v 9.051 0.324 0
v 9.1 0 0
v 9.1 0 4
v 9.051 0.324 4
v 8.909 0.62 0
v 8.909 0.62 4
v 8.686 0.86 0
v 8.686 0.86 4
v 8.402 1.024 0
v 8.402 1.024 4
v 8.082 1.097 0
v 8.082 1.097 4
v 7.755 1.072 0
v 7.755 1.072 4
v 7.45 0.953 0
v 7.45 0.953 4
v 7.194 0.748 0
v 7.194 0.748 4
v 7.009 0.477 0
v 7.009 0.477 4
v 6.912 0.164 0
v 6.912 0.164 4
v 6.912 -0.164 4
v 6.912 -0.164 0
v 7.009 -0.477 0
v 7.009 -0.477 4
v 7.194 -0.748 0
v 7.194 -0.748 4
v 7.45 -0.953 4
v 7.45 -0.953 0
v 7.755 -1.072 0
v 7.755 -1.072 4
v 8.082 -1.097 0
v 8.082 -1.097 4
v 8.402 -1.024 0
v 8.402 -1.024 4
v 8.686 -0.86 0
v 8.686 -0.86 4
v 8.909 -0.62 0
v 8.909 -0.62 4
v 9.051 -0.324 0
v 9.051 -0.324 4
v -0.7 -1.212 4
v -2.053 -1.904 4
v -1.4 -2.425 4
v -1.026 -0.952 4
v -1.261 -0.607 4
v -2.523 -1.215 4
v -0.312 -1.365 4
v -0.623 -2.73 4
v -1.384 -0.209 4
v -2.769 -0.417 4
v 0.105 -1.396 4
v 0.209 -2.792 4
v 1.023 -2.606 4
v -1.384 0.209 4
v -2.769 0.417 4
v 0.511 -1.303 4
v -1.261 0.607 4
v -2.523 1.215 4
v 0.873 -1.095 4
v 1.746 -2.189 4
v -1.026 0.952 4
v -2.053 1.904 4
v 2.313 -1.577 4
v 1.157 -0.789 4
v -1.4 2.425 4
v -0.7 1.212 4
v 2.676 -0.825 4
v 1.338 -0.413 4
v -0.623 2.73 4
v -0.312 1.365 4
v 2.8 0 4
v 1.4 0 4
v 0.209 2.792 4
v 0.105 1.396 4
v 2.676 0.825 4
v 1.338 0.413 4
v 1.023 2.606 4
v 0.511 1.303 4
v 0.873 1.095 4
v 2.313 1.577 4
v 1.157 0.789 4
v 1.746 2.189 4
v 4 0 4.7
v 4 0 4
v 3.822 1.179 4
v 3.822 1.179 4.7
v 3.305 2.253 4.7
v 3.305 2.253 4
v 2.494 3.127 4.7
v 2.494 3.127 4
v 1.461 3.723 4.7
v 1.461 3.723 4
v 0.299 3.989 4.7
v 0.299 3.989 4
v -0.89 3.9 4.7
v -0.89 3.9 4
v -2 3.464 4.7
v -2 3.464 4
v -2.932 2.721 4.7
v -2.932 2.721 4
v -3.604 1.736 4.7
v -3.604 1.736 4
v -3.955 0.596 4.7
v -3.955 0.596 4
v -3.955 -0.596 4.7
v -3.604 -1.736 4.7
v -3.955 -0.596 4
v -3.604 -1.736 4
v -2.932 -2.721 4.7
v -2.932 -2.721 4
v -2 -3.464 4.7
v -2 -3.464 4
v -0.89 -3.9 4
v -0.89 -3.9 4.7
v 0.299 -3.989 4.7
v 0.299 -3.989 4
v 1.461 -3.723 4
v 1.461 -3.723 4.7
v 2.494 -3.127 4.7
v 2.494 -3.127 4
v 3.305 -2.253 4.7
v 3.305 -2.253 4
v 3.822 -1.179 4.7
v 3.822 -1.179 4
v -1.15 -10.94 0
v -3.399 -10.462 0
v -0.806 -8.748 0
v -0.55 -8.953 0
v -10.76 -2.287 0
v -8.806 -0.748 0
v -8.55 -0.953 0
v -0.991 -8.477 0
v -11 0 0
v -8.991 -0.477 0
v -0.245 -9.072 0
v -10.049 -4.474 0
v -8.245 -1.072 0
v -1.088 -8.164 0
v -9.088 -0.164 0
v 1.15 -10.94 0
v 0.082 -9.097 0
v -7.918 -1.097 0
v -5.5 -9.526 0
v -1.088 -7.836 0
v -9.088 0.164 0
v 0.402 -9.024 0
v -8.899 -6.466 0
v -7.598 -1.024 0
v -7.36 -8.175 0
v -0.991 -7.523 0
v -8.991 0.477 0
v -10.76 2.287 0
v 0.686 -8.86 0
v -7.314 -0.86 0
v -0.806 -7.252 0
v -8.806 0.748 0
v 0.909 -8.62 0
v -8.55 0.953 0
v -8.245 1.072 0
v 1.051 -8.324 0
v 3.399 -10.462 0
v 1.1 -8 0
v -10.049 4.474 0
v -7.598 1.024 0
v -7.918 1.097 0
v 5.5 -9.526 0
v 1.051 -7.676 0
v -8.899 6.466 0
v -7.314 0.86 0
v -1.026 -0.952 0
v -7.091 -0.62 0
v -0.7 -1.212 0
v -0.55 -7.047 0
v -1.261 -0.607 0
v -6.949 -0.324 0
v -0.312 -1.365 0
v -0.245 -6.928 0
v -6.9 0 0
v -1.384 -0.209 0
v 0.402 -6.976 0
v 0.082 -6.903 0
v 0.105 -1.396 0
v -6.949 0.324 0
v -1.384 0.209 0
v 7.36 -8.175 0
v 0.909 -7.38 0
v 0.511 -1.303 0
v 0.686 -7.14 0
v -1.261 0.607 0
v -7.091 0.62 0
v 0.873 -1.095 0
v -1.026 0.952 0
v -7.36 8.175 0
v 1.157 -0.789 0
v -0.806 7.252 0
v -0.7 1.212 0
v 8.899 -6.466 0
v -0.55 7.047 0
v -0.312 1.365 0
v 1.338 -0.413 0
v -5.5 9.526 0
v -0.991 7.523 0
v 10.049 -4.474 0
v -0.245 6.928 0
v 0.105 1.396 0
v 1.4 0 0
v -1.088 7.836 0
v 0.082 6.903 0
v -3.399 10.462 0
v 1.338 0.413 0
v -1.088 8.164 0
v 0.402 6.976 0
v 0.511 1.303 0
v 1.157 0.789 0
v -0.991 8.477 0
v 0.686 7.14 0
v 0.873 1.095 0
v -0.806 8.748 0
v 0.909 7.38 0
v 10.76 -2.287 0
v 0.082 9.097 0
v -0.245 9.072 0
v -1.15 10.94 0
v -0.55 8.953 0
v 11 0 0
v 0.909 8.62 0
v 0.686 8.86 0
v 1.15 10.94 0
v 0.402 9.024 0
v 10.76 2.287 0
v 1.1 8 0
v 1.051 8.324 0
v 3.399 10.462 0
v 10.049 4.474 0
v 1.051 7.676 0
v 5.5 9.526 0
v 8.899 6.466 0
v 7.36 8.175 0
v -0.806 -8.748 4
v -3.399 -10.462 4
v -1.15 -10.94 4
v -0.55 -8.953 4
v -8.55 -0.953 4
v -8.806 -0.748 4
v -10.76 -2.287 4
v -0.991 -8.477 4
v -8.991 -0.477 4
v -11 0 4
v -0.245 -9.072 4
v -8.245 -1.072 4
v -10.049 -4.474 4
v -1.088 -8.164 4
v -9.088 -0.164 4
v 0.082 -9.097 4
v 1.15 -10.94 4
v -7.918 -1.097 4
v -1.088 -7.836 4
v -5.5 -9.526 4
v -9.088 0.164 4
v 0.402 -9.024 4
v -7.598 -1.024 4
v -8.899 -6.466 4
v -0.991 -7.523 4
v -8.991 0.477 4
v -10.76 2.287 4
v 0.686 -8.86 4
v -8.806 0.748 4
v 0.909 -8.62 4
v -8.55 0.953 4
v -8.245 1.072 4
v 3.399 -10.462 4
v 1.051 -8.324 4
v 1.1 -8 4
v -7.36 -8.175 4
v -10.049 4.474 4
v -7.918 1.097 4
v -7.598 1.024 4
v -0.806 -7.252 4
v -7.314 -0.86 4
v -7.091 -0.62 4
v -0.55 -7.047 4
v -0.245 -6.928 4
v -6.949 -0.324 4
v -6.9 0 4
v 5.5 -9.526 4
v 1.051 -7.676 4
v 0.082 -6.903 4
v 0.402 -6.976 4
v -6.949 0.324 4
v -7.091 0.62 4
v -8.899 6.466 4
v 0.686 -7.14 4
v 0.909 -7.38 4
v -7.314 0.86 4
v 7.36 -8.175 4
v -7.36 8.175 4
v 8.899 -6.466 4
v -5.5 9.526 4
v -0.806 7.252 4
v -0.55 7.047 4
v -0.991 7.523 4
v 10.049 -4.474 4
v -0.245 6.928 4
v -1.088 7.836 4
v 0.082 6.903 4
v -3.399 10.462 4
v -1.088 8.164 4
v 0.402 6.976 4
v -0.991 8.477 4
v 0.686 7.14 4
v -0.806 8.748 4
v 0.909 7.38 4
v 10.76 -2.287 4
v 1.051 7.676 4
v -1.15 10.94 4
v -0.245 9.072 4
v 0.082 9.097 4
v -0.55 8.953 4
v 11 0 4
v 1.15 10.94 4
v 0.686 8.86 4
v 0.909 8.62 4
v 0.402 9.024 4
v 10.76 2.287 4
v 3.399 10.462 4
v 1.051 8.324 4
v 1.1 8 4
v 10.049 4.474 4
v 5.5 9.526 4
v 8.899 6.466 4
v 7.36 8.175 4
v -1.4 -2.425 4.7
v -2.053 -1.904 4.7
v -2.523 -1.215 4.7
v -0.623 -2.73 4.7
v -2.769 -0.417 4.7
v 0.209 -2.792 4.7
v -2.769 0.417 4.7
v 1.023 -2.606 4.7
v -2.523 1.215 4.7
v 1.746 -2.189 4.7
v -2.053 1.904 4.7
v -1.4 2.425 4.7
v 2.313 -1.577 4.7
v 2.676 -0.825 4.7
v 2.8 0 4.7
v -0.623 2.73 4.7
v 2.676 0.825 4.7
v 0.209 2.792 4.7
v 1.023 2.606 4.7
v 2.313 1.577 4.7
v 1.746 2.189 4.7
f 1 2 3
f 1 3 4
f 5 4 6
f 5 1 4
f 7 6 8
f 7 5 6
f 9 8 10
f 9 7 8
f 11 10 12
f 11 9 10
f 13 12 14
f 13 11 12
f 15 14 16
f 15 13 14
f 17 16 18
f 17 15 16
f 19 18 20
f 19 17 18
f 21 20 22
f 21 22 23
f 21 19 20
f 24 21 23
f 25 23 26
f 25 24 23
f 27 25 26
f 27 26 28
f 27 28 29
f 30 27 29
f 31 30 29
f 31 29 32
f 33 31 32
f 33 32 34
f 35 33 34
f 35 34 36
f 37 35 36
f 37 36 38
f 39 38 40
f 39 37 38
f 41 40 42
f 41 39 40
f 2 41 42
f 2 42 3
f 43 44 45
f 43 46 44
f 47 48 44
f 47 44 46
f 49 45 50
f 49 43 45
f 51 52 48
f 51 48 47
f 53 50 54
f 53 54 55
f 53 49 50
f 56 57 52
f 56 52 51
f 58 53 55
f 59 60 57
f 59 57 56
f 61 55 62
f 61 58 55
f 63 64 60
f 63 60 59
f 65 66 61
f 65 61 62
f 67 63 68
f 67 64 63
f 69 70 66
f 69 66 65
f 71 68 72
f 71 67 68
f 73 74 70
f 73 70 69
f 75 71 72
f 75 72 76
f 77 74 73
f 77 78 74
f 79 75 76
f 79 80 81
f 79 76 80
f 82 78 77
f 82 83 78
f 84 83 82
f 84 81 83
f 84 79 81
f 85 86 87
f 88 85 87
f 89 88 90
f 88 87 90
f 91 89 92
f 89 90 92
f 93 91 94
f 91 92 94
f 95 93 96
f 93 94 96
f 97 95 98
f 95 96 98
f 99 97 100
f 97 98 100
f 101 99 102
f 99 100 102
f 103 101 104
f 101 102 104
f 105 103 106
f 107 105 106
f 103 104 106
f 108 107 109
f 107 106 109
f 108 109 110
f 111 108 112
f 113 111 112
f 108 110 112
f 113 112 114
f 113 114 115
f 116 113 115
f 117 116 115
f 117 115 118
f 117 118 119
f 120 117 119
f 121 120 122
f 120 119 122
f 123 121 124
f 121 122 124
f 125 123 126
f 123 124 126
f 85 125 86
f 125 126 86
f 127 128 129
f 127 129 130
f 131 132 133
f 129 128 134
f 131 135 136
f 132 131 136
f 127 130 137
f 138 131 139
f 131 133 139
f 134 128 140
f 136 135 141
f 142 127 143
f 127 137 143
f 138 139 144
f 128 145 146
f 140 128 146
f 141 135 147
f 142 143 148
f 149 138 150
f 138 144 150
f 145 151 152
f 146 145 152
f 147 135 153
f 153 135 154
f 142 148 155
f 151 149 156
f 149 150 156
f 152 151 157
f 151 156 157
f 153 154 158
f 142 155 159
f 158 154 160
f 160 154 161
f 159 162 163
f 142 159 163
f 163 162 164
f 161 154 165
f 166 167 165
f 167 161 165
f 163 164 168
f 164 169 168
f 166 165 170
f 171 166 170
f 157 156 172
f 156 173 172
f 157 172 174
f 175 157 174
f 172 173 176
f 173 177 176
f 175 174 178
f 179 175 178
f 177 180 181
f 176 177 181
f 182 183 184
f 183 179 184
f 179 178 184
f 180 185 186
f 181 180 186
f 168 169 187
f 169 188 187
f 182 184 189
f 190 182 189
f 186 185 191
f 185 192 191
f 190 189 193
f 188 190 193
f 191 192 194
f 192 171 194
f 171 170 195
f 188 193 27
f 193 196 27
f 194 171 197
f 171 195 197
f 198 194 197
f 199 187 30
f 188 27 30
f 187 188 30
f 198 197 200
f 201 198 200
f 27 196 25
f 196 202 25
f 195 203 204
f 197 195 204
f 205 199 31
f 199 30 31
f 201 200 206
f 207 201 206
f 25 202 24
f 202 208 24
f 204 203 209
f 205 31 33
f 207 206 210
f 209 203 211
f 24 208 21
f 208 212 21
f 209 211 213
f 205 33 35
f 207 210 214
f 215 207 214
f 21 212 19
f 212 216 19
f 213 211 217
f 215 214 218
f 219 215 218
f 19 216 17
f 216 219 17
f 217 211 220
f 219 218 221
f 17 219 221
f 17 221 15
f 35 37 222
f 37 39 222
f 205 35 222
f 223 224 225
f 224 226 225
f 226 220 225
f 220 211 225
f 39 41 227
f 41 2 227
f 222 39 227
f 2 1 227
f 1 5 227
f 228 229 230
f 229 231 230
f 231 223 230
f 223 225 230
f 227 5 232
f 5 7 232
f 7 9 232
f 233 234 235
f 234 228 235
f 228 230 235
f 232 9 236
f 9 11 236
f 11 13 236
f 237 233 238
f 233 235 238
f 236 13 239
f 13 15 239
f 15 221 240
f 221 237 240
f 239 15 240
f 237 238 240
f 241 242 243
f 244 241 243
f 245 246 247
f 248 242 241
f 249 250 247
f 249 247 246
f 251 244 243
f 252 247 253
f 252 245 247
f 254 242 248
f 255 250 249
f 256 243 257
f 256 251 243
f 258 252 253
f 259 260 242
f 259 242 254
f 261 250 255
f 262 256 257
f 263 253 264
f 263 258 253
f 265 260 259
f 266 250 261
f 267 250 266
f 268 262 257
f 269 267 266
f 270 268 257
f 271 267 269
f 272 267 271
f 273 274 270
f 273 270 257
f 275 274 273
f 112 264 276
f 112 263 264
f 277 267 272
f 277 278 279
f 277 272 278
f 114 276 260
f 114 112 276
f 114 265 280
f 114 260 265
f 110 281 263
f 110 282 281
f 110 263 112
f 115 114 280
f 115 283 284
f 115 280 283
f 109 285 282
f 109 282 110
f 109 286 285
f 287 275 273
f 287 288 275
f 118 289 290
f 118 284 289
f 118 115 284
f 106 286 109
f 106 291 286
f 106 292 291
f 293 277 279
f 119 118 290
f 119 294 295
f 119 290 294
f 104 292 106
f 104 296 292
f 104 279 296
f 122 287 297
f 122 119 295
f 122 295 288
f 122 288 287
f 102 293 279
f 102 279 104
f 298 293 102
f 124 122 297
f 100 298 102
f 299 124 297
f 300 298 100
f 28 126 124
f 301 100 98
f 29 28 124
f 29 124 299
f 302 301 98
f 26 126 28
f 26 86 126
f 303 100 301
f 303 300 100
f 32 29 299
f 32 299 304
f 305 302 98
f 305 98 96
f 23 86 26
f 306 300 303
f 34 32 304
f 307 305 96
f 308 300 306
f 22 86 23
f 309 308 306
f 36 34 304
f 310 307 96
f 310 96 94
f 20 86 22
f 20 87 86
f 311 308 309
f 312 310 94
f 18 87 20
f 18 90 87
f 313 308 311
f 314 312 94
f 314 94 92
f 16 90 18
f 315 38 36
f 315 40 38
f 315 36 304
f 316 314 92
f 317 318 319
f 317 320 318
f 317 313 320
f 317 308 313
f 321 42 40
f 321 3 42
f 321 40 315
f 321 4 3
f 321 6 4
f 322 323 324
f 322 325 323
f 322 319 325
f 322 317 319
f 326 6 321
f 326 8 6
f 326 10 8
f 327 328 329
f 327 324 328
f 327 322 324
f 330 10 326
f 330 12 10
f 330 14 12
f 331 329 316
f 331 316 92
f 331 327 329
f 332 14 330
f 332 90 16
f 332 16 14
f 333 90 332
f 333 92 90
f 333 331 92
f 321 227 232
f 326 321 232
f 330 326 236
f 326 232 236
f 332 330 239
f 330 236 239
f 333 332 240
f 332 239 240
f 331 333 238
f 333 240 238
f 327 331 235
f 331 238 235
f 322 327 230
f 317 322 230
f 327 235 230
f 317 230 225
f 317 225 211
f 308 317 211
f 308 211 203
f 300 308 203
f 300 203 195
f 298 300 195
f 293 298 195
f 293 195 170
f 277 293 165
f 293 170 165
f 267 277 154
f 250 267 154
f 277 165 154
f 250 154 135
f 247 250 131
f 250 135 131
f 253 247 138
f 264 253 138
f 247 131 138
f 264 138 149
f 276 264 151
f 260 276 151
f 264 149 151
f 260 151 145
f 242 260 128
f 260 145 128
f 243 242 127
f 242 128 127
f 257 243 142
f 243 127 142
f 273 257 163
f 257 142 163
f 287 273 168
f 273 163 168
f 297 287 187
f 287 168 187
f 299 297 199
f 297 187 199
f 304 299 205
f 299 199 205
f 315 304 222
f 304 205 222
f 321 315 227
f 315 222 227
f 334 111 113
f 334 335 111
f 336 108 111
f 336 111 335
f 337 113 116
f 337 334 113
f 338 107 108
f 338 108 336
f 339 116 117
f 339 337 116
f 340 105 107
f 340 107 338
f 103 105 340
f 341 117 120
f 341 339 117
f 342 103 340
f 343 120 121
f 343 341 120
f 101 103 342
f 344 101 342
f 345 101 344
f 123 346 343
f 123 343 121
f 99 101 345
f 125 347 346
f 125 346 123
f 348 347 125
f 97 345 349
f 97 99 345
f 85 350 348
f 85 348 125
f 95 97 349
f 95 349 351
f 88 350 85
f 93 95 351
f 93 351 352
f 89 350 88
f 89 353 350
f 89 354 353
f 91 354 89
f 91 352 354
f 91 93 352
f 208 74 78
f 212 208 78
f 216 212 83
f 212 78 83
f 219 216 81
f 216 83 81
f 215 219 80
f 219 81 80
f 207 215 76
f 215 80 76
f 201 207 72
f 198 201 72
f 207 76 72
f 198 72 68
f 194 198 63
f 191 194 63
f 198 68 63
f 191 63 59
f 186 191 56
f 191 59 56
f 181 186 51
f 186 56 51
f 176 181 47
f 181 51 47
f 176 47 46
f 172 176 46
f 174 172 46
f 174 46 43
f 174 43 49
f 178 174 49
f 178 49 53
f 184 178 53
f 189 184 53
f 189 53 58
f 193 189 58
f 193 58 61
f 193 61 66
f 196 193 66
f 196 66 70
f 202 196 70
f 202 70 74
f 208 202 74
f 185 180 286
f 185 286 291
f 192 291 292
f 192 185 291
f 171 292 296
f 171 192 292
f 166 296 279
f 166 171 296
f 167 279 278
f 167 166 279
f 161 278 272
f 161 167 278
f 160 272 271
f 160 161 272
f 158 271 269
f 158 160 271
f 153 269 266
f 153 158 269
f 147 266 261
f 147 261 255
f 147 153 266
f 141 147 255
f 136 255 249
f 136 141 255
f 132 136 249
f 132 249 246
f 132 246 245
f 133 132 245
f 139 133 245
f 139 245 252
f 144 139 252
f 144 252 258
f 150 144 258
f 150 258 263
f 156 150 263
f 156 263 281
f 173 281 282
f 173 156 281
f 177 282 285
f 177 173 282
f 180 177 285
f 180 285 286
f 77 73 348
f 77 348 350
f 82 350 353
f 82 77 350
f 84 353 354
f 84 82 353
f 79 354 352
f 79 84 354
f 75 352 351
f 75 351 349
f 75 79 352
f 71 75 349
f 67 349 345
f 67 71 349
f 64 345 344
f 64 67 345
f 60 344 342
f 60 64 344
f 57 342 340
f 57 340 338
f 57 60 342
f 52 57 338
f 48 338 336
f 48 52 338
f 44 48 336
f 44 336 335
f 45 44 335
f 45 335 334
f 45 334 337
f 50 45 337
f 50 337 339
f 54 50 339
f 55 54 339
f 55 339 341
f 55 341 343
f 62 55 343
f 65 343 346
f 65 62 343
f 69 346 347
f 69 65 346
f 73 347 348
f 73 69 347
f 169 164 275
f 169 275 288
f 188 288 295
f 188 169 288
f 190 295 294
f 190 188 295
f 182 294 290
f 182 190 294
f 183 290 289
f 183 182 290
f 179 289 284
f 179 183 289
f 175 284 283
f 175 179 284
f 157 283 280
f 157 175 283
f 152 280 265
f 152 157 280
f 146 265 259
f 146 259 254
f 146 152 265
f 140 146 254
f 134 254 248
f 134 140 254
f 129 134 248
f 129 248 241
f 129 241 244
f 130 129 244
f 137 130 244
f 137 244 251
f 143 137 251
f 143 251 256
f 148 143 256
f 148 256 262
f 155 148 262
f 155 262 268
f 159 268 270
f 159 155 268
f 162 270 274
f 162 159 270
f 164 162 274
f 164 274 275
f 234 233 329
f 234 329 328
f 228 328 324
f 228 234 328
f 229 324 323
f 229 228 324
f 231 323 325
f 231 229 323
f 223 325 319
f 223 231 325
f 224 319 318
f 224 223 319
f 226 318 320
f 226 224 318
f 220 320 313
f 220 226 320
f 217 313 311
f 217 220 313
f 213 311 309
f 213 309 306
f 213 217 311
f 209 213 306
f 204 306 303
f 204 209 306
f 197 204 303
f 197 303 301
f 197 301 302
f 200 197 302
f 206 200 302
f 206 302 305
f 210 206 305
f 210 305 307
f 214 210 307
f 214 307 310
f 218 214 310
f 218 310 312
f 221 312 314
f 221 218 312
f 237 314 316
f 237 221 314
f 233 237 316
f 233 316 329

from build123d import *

# Parameters (mm, degrees)
ESQUISSE1_R      = 11
ESQUISSE1_R_2    = 1.1
EXTRUSION1_DEPTH = 4
ESQUISSE2_R      = 4
ESQUISSE2_R_2    = 2.8
EXTRUSION3_DEPTH = 0.7
EXTRUSION4_REACH = 6
ESQUISSE3_R      = 1.4


with BuildPart() as part:
    # Esquisse1 → Extrusion1 (new body)
    with BuildSketch(Plane.XY):
        Circle(ESQUISSE1_R)
        with Locations((0, 8)):
            Circle(ESQUISSE1_R_2, mode=Mode.SUBTRACT)
        with Locations((-8, 0)):
            Circle(ESQUISSE1_R_2, mode=Mode.SUBTRACT)
        with Locations((8, 0)):
            Circle(ESQUISSE1_R_2, mode=Mode.SUBTRACT)
        with Locations((0, -8)):
            Circle(ESQUISSE1_R_2, mode=Mode.SUBTRACT)
    extrude(amount=EXTRUSION1_DEPTH)

    # Esquisse2 → Extrusion3 (add)
    with BuildSketch(Plane.XY.offset(4)):
        Circle(ESQUISSE2_R)
        Circle(ESQUISSE2_R_2, mode=Mode.SUBTRACT)
    extrude(amount=EXTRUSION3_DEPTH)

    # Esquisse3 → Extrusion4 (cut, up to next)
    with BuildSketch(Plane.XY.offset(4), mode=Mode.PRIVATE) as extrusion4_sk1:
        Circle(ESQUISSE3_R)
    extrusion4_tool1 = extrude(extrusion4_sk1.sketch, amount=-EXTRUSION4_REACH, mode=Mode.PRIVATE) & part.part
    add(extrusion4_tool1.solids().sort_by_distance((0, 0, 4))[0], mode=Mode.SUBTRACT)


solid = part.part
